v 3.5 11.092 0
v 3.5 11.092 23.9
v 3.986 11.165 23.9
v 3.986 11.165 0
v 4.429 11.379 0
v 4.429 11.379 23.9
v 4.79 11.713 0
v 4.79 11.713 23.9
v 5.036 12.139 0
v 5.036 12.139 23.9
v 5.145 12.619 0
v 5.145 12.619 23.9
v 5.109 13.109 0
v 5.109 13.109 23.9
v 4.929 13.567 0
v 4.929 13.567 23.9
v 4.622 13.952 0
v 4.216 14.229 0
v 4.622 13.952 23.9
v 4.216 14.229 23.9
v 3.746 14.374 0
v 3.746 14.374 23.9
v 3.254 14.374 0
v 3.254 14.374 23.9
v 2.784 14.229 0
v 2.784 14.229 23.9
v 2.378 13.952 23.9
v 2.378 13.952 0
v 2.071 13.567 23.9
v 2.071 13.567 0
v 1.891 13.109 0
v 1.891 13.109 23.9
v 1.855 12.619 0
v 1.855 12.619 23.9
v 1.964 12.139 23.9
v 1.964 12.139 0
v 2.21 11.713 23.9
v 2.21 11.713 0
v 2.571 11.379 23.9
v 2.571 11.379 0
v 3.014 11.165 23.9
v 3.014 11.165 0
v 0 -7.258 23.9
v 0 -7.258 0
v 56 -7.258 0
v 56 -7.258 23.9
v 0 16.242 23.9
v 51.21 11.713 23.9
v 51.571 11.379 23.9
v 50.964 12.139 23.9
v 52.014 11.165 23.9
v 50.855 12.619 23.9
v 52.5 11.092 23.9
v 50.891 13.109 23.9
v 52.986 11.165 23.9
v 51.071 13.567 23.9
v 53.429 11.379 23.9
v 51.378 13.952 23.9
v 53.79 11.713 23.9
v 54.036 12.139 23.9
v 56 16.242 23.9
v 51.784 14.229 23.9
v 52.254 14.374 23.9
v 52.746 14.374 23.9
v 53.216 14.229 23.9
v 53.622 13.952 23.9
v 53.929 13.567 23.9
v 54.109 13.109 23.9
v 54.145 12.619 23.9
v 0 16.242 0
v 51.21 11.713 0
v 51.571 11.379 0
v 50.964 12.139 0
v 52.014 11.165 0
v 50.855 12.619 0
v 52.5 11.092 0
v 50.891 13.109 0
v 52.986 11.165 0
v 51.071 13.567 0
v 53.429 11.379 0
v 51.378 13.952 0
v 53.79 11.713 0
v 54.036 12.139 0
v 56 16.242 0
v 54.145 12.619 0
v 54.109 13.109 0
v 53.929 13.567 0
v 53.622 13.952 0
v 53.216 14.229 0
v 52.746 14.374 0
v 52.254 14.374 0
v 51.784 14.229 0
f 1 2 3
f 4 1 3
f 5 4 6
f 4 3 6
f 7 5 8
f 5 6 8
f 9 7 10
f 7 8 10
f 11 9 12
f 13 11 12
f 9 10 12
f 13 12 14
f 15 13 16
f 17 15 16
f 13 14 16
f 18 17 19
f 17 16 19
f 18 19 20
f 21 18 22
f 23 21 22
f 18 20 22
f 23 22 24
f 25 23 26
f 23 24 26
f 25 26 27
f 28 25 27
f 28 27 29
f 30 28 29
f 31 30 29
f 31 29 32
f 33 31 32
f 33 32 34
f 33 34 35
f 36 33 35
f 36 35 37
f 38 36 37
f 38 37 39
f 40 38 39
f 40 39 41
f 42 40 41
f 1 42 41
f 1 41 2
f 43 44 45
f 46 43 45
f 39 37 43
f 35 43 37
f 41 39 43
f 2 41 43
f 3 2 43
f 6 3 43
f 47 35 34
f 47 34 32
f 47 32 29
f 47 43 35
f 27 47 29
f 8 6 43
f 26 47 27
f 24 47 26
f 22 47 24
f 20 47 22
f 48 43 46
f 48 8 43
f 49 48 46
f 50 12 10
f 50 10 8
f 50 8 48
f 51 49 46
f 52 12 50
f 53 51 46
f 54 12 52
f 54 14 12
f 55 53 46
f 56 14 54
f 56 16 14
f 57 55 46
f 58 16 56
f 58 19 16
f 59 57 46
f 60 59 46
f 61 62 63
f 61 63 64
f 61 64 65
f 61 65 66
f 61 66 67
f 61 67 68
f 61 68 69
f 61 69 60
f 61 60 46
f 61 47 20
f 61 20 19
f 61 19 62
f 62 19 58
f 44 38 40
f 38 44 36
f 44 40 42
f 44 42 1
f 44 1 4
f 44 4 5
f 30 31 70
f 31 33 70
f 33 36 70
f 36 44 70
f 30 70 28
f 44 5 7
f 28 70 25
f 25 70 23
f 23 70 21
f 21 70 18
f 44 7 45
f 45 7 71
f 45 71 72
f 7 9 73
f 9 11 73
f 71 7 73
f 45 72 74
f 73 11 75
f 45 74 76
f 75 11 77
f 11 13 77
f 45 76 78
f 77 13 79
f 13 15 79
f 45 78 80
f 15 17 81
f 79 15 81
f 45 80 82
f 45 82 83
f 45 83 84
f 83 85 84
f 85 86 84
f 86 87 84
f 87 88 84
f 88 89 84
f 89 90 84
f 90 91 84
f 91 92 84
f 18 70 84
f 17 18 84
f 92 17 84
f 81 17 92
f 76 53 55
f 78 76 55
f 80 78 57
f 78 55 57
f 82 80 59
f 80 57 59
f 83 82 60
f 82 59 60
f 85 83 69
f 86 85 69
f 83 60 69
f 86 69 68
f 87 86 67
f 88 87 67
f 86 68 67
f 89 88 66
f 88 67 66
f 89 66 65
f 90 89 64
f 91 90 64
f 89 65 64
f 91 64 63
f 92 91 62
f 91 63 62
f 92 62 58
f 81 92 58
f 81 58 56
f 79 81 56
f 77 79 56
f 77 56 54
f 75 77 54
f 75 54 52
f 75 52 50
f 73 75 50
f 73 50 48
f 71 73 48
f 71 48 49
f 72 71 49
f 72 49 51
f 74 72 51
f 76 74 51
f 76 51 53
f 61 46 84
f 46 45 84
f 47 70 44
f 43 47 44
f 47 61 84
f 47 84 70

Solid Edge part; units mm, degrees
sketch "Sketch1" plane through (0, 0, 0) normal (0, 0, 1) x (1, 0, 0)
  line L0 (0, -7.2579) -> (56, -7.2579)
  line L1 (56, -7.2579) -> (56, 17.2421)
  line L2 (56, 17.2421) -> (0, 17.2421)
  line L3 (0, 17.2421) -> (0, -7.2579)
  dimension "D1" = 56
  dimension "D2" = 24.5
extrude "Protrusion1" add sketch "Sketch1" along normal blind 23.9
hole "Hole_1" at (52.5, 12.7421, 23.9) direction (0, 0, -1) diameter 3.3 end through all
hole "Hole1" at (3.5, 12.7421, 23.9) direction (0, 0, -1) diameter 3.3 end through all
sketch "Sketch2" plane through (28, 4.9921, 23.9) normal (0, 0, 1) x (1, 0, 0)
  line L0 (-28, 12.25) -> (28, 12.25)
  line L1 (28, 12.25) -> (28, 11.25)
  line L2 (28, 11.25) -> (-28, 11.25)
  line L3 (-28, 11.25) -> (-28, 12.25)
  dimension "D1" = 1
extrude "Cutout1" cut sketch "Sketch2" against normal through all
properties material "Aluminum, 6061-T6"
